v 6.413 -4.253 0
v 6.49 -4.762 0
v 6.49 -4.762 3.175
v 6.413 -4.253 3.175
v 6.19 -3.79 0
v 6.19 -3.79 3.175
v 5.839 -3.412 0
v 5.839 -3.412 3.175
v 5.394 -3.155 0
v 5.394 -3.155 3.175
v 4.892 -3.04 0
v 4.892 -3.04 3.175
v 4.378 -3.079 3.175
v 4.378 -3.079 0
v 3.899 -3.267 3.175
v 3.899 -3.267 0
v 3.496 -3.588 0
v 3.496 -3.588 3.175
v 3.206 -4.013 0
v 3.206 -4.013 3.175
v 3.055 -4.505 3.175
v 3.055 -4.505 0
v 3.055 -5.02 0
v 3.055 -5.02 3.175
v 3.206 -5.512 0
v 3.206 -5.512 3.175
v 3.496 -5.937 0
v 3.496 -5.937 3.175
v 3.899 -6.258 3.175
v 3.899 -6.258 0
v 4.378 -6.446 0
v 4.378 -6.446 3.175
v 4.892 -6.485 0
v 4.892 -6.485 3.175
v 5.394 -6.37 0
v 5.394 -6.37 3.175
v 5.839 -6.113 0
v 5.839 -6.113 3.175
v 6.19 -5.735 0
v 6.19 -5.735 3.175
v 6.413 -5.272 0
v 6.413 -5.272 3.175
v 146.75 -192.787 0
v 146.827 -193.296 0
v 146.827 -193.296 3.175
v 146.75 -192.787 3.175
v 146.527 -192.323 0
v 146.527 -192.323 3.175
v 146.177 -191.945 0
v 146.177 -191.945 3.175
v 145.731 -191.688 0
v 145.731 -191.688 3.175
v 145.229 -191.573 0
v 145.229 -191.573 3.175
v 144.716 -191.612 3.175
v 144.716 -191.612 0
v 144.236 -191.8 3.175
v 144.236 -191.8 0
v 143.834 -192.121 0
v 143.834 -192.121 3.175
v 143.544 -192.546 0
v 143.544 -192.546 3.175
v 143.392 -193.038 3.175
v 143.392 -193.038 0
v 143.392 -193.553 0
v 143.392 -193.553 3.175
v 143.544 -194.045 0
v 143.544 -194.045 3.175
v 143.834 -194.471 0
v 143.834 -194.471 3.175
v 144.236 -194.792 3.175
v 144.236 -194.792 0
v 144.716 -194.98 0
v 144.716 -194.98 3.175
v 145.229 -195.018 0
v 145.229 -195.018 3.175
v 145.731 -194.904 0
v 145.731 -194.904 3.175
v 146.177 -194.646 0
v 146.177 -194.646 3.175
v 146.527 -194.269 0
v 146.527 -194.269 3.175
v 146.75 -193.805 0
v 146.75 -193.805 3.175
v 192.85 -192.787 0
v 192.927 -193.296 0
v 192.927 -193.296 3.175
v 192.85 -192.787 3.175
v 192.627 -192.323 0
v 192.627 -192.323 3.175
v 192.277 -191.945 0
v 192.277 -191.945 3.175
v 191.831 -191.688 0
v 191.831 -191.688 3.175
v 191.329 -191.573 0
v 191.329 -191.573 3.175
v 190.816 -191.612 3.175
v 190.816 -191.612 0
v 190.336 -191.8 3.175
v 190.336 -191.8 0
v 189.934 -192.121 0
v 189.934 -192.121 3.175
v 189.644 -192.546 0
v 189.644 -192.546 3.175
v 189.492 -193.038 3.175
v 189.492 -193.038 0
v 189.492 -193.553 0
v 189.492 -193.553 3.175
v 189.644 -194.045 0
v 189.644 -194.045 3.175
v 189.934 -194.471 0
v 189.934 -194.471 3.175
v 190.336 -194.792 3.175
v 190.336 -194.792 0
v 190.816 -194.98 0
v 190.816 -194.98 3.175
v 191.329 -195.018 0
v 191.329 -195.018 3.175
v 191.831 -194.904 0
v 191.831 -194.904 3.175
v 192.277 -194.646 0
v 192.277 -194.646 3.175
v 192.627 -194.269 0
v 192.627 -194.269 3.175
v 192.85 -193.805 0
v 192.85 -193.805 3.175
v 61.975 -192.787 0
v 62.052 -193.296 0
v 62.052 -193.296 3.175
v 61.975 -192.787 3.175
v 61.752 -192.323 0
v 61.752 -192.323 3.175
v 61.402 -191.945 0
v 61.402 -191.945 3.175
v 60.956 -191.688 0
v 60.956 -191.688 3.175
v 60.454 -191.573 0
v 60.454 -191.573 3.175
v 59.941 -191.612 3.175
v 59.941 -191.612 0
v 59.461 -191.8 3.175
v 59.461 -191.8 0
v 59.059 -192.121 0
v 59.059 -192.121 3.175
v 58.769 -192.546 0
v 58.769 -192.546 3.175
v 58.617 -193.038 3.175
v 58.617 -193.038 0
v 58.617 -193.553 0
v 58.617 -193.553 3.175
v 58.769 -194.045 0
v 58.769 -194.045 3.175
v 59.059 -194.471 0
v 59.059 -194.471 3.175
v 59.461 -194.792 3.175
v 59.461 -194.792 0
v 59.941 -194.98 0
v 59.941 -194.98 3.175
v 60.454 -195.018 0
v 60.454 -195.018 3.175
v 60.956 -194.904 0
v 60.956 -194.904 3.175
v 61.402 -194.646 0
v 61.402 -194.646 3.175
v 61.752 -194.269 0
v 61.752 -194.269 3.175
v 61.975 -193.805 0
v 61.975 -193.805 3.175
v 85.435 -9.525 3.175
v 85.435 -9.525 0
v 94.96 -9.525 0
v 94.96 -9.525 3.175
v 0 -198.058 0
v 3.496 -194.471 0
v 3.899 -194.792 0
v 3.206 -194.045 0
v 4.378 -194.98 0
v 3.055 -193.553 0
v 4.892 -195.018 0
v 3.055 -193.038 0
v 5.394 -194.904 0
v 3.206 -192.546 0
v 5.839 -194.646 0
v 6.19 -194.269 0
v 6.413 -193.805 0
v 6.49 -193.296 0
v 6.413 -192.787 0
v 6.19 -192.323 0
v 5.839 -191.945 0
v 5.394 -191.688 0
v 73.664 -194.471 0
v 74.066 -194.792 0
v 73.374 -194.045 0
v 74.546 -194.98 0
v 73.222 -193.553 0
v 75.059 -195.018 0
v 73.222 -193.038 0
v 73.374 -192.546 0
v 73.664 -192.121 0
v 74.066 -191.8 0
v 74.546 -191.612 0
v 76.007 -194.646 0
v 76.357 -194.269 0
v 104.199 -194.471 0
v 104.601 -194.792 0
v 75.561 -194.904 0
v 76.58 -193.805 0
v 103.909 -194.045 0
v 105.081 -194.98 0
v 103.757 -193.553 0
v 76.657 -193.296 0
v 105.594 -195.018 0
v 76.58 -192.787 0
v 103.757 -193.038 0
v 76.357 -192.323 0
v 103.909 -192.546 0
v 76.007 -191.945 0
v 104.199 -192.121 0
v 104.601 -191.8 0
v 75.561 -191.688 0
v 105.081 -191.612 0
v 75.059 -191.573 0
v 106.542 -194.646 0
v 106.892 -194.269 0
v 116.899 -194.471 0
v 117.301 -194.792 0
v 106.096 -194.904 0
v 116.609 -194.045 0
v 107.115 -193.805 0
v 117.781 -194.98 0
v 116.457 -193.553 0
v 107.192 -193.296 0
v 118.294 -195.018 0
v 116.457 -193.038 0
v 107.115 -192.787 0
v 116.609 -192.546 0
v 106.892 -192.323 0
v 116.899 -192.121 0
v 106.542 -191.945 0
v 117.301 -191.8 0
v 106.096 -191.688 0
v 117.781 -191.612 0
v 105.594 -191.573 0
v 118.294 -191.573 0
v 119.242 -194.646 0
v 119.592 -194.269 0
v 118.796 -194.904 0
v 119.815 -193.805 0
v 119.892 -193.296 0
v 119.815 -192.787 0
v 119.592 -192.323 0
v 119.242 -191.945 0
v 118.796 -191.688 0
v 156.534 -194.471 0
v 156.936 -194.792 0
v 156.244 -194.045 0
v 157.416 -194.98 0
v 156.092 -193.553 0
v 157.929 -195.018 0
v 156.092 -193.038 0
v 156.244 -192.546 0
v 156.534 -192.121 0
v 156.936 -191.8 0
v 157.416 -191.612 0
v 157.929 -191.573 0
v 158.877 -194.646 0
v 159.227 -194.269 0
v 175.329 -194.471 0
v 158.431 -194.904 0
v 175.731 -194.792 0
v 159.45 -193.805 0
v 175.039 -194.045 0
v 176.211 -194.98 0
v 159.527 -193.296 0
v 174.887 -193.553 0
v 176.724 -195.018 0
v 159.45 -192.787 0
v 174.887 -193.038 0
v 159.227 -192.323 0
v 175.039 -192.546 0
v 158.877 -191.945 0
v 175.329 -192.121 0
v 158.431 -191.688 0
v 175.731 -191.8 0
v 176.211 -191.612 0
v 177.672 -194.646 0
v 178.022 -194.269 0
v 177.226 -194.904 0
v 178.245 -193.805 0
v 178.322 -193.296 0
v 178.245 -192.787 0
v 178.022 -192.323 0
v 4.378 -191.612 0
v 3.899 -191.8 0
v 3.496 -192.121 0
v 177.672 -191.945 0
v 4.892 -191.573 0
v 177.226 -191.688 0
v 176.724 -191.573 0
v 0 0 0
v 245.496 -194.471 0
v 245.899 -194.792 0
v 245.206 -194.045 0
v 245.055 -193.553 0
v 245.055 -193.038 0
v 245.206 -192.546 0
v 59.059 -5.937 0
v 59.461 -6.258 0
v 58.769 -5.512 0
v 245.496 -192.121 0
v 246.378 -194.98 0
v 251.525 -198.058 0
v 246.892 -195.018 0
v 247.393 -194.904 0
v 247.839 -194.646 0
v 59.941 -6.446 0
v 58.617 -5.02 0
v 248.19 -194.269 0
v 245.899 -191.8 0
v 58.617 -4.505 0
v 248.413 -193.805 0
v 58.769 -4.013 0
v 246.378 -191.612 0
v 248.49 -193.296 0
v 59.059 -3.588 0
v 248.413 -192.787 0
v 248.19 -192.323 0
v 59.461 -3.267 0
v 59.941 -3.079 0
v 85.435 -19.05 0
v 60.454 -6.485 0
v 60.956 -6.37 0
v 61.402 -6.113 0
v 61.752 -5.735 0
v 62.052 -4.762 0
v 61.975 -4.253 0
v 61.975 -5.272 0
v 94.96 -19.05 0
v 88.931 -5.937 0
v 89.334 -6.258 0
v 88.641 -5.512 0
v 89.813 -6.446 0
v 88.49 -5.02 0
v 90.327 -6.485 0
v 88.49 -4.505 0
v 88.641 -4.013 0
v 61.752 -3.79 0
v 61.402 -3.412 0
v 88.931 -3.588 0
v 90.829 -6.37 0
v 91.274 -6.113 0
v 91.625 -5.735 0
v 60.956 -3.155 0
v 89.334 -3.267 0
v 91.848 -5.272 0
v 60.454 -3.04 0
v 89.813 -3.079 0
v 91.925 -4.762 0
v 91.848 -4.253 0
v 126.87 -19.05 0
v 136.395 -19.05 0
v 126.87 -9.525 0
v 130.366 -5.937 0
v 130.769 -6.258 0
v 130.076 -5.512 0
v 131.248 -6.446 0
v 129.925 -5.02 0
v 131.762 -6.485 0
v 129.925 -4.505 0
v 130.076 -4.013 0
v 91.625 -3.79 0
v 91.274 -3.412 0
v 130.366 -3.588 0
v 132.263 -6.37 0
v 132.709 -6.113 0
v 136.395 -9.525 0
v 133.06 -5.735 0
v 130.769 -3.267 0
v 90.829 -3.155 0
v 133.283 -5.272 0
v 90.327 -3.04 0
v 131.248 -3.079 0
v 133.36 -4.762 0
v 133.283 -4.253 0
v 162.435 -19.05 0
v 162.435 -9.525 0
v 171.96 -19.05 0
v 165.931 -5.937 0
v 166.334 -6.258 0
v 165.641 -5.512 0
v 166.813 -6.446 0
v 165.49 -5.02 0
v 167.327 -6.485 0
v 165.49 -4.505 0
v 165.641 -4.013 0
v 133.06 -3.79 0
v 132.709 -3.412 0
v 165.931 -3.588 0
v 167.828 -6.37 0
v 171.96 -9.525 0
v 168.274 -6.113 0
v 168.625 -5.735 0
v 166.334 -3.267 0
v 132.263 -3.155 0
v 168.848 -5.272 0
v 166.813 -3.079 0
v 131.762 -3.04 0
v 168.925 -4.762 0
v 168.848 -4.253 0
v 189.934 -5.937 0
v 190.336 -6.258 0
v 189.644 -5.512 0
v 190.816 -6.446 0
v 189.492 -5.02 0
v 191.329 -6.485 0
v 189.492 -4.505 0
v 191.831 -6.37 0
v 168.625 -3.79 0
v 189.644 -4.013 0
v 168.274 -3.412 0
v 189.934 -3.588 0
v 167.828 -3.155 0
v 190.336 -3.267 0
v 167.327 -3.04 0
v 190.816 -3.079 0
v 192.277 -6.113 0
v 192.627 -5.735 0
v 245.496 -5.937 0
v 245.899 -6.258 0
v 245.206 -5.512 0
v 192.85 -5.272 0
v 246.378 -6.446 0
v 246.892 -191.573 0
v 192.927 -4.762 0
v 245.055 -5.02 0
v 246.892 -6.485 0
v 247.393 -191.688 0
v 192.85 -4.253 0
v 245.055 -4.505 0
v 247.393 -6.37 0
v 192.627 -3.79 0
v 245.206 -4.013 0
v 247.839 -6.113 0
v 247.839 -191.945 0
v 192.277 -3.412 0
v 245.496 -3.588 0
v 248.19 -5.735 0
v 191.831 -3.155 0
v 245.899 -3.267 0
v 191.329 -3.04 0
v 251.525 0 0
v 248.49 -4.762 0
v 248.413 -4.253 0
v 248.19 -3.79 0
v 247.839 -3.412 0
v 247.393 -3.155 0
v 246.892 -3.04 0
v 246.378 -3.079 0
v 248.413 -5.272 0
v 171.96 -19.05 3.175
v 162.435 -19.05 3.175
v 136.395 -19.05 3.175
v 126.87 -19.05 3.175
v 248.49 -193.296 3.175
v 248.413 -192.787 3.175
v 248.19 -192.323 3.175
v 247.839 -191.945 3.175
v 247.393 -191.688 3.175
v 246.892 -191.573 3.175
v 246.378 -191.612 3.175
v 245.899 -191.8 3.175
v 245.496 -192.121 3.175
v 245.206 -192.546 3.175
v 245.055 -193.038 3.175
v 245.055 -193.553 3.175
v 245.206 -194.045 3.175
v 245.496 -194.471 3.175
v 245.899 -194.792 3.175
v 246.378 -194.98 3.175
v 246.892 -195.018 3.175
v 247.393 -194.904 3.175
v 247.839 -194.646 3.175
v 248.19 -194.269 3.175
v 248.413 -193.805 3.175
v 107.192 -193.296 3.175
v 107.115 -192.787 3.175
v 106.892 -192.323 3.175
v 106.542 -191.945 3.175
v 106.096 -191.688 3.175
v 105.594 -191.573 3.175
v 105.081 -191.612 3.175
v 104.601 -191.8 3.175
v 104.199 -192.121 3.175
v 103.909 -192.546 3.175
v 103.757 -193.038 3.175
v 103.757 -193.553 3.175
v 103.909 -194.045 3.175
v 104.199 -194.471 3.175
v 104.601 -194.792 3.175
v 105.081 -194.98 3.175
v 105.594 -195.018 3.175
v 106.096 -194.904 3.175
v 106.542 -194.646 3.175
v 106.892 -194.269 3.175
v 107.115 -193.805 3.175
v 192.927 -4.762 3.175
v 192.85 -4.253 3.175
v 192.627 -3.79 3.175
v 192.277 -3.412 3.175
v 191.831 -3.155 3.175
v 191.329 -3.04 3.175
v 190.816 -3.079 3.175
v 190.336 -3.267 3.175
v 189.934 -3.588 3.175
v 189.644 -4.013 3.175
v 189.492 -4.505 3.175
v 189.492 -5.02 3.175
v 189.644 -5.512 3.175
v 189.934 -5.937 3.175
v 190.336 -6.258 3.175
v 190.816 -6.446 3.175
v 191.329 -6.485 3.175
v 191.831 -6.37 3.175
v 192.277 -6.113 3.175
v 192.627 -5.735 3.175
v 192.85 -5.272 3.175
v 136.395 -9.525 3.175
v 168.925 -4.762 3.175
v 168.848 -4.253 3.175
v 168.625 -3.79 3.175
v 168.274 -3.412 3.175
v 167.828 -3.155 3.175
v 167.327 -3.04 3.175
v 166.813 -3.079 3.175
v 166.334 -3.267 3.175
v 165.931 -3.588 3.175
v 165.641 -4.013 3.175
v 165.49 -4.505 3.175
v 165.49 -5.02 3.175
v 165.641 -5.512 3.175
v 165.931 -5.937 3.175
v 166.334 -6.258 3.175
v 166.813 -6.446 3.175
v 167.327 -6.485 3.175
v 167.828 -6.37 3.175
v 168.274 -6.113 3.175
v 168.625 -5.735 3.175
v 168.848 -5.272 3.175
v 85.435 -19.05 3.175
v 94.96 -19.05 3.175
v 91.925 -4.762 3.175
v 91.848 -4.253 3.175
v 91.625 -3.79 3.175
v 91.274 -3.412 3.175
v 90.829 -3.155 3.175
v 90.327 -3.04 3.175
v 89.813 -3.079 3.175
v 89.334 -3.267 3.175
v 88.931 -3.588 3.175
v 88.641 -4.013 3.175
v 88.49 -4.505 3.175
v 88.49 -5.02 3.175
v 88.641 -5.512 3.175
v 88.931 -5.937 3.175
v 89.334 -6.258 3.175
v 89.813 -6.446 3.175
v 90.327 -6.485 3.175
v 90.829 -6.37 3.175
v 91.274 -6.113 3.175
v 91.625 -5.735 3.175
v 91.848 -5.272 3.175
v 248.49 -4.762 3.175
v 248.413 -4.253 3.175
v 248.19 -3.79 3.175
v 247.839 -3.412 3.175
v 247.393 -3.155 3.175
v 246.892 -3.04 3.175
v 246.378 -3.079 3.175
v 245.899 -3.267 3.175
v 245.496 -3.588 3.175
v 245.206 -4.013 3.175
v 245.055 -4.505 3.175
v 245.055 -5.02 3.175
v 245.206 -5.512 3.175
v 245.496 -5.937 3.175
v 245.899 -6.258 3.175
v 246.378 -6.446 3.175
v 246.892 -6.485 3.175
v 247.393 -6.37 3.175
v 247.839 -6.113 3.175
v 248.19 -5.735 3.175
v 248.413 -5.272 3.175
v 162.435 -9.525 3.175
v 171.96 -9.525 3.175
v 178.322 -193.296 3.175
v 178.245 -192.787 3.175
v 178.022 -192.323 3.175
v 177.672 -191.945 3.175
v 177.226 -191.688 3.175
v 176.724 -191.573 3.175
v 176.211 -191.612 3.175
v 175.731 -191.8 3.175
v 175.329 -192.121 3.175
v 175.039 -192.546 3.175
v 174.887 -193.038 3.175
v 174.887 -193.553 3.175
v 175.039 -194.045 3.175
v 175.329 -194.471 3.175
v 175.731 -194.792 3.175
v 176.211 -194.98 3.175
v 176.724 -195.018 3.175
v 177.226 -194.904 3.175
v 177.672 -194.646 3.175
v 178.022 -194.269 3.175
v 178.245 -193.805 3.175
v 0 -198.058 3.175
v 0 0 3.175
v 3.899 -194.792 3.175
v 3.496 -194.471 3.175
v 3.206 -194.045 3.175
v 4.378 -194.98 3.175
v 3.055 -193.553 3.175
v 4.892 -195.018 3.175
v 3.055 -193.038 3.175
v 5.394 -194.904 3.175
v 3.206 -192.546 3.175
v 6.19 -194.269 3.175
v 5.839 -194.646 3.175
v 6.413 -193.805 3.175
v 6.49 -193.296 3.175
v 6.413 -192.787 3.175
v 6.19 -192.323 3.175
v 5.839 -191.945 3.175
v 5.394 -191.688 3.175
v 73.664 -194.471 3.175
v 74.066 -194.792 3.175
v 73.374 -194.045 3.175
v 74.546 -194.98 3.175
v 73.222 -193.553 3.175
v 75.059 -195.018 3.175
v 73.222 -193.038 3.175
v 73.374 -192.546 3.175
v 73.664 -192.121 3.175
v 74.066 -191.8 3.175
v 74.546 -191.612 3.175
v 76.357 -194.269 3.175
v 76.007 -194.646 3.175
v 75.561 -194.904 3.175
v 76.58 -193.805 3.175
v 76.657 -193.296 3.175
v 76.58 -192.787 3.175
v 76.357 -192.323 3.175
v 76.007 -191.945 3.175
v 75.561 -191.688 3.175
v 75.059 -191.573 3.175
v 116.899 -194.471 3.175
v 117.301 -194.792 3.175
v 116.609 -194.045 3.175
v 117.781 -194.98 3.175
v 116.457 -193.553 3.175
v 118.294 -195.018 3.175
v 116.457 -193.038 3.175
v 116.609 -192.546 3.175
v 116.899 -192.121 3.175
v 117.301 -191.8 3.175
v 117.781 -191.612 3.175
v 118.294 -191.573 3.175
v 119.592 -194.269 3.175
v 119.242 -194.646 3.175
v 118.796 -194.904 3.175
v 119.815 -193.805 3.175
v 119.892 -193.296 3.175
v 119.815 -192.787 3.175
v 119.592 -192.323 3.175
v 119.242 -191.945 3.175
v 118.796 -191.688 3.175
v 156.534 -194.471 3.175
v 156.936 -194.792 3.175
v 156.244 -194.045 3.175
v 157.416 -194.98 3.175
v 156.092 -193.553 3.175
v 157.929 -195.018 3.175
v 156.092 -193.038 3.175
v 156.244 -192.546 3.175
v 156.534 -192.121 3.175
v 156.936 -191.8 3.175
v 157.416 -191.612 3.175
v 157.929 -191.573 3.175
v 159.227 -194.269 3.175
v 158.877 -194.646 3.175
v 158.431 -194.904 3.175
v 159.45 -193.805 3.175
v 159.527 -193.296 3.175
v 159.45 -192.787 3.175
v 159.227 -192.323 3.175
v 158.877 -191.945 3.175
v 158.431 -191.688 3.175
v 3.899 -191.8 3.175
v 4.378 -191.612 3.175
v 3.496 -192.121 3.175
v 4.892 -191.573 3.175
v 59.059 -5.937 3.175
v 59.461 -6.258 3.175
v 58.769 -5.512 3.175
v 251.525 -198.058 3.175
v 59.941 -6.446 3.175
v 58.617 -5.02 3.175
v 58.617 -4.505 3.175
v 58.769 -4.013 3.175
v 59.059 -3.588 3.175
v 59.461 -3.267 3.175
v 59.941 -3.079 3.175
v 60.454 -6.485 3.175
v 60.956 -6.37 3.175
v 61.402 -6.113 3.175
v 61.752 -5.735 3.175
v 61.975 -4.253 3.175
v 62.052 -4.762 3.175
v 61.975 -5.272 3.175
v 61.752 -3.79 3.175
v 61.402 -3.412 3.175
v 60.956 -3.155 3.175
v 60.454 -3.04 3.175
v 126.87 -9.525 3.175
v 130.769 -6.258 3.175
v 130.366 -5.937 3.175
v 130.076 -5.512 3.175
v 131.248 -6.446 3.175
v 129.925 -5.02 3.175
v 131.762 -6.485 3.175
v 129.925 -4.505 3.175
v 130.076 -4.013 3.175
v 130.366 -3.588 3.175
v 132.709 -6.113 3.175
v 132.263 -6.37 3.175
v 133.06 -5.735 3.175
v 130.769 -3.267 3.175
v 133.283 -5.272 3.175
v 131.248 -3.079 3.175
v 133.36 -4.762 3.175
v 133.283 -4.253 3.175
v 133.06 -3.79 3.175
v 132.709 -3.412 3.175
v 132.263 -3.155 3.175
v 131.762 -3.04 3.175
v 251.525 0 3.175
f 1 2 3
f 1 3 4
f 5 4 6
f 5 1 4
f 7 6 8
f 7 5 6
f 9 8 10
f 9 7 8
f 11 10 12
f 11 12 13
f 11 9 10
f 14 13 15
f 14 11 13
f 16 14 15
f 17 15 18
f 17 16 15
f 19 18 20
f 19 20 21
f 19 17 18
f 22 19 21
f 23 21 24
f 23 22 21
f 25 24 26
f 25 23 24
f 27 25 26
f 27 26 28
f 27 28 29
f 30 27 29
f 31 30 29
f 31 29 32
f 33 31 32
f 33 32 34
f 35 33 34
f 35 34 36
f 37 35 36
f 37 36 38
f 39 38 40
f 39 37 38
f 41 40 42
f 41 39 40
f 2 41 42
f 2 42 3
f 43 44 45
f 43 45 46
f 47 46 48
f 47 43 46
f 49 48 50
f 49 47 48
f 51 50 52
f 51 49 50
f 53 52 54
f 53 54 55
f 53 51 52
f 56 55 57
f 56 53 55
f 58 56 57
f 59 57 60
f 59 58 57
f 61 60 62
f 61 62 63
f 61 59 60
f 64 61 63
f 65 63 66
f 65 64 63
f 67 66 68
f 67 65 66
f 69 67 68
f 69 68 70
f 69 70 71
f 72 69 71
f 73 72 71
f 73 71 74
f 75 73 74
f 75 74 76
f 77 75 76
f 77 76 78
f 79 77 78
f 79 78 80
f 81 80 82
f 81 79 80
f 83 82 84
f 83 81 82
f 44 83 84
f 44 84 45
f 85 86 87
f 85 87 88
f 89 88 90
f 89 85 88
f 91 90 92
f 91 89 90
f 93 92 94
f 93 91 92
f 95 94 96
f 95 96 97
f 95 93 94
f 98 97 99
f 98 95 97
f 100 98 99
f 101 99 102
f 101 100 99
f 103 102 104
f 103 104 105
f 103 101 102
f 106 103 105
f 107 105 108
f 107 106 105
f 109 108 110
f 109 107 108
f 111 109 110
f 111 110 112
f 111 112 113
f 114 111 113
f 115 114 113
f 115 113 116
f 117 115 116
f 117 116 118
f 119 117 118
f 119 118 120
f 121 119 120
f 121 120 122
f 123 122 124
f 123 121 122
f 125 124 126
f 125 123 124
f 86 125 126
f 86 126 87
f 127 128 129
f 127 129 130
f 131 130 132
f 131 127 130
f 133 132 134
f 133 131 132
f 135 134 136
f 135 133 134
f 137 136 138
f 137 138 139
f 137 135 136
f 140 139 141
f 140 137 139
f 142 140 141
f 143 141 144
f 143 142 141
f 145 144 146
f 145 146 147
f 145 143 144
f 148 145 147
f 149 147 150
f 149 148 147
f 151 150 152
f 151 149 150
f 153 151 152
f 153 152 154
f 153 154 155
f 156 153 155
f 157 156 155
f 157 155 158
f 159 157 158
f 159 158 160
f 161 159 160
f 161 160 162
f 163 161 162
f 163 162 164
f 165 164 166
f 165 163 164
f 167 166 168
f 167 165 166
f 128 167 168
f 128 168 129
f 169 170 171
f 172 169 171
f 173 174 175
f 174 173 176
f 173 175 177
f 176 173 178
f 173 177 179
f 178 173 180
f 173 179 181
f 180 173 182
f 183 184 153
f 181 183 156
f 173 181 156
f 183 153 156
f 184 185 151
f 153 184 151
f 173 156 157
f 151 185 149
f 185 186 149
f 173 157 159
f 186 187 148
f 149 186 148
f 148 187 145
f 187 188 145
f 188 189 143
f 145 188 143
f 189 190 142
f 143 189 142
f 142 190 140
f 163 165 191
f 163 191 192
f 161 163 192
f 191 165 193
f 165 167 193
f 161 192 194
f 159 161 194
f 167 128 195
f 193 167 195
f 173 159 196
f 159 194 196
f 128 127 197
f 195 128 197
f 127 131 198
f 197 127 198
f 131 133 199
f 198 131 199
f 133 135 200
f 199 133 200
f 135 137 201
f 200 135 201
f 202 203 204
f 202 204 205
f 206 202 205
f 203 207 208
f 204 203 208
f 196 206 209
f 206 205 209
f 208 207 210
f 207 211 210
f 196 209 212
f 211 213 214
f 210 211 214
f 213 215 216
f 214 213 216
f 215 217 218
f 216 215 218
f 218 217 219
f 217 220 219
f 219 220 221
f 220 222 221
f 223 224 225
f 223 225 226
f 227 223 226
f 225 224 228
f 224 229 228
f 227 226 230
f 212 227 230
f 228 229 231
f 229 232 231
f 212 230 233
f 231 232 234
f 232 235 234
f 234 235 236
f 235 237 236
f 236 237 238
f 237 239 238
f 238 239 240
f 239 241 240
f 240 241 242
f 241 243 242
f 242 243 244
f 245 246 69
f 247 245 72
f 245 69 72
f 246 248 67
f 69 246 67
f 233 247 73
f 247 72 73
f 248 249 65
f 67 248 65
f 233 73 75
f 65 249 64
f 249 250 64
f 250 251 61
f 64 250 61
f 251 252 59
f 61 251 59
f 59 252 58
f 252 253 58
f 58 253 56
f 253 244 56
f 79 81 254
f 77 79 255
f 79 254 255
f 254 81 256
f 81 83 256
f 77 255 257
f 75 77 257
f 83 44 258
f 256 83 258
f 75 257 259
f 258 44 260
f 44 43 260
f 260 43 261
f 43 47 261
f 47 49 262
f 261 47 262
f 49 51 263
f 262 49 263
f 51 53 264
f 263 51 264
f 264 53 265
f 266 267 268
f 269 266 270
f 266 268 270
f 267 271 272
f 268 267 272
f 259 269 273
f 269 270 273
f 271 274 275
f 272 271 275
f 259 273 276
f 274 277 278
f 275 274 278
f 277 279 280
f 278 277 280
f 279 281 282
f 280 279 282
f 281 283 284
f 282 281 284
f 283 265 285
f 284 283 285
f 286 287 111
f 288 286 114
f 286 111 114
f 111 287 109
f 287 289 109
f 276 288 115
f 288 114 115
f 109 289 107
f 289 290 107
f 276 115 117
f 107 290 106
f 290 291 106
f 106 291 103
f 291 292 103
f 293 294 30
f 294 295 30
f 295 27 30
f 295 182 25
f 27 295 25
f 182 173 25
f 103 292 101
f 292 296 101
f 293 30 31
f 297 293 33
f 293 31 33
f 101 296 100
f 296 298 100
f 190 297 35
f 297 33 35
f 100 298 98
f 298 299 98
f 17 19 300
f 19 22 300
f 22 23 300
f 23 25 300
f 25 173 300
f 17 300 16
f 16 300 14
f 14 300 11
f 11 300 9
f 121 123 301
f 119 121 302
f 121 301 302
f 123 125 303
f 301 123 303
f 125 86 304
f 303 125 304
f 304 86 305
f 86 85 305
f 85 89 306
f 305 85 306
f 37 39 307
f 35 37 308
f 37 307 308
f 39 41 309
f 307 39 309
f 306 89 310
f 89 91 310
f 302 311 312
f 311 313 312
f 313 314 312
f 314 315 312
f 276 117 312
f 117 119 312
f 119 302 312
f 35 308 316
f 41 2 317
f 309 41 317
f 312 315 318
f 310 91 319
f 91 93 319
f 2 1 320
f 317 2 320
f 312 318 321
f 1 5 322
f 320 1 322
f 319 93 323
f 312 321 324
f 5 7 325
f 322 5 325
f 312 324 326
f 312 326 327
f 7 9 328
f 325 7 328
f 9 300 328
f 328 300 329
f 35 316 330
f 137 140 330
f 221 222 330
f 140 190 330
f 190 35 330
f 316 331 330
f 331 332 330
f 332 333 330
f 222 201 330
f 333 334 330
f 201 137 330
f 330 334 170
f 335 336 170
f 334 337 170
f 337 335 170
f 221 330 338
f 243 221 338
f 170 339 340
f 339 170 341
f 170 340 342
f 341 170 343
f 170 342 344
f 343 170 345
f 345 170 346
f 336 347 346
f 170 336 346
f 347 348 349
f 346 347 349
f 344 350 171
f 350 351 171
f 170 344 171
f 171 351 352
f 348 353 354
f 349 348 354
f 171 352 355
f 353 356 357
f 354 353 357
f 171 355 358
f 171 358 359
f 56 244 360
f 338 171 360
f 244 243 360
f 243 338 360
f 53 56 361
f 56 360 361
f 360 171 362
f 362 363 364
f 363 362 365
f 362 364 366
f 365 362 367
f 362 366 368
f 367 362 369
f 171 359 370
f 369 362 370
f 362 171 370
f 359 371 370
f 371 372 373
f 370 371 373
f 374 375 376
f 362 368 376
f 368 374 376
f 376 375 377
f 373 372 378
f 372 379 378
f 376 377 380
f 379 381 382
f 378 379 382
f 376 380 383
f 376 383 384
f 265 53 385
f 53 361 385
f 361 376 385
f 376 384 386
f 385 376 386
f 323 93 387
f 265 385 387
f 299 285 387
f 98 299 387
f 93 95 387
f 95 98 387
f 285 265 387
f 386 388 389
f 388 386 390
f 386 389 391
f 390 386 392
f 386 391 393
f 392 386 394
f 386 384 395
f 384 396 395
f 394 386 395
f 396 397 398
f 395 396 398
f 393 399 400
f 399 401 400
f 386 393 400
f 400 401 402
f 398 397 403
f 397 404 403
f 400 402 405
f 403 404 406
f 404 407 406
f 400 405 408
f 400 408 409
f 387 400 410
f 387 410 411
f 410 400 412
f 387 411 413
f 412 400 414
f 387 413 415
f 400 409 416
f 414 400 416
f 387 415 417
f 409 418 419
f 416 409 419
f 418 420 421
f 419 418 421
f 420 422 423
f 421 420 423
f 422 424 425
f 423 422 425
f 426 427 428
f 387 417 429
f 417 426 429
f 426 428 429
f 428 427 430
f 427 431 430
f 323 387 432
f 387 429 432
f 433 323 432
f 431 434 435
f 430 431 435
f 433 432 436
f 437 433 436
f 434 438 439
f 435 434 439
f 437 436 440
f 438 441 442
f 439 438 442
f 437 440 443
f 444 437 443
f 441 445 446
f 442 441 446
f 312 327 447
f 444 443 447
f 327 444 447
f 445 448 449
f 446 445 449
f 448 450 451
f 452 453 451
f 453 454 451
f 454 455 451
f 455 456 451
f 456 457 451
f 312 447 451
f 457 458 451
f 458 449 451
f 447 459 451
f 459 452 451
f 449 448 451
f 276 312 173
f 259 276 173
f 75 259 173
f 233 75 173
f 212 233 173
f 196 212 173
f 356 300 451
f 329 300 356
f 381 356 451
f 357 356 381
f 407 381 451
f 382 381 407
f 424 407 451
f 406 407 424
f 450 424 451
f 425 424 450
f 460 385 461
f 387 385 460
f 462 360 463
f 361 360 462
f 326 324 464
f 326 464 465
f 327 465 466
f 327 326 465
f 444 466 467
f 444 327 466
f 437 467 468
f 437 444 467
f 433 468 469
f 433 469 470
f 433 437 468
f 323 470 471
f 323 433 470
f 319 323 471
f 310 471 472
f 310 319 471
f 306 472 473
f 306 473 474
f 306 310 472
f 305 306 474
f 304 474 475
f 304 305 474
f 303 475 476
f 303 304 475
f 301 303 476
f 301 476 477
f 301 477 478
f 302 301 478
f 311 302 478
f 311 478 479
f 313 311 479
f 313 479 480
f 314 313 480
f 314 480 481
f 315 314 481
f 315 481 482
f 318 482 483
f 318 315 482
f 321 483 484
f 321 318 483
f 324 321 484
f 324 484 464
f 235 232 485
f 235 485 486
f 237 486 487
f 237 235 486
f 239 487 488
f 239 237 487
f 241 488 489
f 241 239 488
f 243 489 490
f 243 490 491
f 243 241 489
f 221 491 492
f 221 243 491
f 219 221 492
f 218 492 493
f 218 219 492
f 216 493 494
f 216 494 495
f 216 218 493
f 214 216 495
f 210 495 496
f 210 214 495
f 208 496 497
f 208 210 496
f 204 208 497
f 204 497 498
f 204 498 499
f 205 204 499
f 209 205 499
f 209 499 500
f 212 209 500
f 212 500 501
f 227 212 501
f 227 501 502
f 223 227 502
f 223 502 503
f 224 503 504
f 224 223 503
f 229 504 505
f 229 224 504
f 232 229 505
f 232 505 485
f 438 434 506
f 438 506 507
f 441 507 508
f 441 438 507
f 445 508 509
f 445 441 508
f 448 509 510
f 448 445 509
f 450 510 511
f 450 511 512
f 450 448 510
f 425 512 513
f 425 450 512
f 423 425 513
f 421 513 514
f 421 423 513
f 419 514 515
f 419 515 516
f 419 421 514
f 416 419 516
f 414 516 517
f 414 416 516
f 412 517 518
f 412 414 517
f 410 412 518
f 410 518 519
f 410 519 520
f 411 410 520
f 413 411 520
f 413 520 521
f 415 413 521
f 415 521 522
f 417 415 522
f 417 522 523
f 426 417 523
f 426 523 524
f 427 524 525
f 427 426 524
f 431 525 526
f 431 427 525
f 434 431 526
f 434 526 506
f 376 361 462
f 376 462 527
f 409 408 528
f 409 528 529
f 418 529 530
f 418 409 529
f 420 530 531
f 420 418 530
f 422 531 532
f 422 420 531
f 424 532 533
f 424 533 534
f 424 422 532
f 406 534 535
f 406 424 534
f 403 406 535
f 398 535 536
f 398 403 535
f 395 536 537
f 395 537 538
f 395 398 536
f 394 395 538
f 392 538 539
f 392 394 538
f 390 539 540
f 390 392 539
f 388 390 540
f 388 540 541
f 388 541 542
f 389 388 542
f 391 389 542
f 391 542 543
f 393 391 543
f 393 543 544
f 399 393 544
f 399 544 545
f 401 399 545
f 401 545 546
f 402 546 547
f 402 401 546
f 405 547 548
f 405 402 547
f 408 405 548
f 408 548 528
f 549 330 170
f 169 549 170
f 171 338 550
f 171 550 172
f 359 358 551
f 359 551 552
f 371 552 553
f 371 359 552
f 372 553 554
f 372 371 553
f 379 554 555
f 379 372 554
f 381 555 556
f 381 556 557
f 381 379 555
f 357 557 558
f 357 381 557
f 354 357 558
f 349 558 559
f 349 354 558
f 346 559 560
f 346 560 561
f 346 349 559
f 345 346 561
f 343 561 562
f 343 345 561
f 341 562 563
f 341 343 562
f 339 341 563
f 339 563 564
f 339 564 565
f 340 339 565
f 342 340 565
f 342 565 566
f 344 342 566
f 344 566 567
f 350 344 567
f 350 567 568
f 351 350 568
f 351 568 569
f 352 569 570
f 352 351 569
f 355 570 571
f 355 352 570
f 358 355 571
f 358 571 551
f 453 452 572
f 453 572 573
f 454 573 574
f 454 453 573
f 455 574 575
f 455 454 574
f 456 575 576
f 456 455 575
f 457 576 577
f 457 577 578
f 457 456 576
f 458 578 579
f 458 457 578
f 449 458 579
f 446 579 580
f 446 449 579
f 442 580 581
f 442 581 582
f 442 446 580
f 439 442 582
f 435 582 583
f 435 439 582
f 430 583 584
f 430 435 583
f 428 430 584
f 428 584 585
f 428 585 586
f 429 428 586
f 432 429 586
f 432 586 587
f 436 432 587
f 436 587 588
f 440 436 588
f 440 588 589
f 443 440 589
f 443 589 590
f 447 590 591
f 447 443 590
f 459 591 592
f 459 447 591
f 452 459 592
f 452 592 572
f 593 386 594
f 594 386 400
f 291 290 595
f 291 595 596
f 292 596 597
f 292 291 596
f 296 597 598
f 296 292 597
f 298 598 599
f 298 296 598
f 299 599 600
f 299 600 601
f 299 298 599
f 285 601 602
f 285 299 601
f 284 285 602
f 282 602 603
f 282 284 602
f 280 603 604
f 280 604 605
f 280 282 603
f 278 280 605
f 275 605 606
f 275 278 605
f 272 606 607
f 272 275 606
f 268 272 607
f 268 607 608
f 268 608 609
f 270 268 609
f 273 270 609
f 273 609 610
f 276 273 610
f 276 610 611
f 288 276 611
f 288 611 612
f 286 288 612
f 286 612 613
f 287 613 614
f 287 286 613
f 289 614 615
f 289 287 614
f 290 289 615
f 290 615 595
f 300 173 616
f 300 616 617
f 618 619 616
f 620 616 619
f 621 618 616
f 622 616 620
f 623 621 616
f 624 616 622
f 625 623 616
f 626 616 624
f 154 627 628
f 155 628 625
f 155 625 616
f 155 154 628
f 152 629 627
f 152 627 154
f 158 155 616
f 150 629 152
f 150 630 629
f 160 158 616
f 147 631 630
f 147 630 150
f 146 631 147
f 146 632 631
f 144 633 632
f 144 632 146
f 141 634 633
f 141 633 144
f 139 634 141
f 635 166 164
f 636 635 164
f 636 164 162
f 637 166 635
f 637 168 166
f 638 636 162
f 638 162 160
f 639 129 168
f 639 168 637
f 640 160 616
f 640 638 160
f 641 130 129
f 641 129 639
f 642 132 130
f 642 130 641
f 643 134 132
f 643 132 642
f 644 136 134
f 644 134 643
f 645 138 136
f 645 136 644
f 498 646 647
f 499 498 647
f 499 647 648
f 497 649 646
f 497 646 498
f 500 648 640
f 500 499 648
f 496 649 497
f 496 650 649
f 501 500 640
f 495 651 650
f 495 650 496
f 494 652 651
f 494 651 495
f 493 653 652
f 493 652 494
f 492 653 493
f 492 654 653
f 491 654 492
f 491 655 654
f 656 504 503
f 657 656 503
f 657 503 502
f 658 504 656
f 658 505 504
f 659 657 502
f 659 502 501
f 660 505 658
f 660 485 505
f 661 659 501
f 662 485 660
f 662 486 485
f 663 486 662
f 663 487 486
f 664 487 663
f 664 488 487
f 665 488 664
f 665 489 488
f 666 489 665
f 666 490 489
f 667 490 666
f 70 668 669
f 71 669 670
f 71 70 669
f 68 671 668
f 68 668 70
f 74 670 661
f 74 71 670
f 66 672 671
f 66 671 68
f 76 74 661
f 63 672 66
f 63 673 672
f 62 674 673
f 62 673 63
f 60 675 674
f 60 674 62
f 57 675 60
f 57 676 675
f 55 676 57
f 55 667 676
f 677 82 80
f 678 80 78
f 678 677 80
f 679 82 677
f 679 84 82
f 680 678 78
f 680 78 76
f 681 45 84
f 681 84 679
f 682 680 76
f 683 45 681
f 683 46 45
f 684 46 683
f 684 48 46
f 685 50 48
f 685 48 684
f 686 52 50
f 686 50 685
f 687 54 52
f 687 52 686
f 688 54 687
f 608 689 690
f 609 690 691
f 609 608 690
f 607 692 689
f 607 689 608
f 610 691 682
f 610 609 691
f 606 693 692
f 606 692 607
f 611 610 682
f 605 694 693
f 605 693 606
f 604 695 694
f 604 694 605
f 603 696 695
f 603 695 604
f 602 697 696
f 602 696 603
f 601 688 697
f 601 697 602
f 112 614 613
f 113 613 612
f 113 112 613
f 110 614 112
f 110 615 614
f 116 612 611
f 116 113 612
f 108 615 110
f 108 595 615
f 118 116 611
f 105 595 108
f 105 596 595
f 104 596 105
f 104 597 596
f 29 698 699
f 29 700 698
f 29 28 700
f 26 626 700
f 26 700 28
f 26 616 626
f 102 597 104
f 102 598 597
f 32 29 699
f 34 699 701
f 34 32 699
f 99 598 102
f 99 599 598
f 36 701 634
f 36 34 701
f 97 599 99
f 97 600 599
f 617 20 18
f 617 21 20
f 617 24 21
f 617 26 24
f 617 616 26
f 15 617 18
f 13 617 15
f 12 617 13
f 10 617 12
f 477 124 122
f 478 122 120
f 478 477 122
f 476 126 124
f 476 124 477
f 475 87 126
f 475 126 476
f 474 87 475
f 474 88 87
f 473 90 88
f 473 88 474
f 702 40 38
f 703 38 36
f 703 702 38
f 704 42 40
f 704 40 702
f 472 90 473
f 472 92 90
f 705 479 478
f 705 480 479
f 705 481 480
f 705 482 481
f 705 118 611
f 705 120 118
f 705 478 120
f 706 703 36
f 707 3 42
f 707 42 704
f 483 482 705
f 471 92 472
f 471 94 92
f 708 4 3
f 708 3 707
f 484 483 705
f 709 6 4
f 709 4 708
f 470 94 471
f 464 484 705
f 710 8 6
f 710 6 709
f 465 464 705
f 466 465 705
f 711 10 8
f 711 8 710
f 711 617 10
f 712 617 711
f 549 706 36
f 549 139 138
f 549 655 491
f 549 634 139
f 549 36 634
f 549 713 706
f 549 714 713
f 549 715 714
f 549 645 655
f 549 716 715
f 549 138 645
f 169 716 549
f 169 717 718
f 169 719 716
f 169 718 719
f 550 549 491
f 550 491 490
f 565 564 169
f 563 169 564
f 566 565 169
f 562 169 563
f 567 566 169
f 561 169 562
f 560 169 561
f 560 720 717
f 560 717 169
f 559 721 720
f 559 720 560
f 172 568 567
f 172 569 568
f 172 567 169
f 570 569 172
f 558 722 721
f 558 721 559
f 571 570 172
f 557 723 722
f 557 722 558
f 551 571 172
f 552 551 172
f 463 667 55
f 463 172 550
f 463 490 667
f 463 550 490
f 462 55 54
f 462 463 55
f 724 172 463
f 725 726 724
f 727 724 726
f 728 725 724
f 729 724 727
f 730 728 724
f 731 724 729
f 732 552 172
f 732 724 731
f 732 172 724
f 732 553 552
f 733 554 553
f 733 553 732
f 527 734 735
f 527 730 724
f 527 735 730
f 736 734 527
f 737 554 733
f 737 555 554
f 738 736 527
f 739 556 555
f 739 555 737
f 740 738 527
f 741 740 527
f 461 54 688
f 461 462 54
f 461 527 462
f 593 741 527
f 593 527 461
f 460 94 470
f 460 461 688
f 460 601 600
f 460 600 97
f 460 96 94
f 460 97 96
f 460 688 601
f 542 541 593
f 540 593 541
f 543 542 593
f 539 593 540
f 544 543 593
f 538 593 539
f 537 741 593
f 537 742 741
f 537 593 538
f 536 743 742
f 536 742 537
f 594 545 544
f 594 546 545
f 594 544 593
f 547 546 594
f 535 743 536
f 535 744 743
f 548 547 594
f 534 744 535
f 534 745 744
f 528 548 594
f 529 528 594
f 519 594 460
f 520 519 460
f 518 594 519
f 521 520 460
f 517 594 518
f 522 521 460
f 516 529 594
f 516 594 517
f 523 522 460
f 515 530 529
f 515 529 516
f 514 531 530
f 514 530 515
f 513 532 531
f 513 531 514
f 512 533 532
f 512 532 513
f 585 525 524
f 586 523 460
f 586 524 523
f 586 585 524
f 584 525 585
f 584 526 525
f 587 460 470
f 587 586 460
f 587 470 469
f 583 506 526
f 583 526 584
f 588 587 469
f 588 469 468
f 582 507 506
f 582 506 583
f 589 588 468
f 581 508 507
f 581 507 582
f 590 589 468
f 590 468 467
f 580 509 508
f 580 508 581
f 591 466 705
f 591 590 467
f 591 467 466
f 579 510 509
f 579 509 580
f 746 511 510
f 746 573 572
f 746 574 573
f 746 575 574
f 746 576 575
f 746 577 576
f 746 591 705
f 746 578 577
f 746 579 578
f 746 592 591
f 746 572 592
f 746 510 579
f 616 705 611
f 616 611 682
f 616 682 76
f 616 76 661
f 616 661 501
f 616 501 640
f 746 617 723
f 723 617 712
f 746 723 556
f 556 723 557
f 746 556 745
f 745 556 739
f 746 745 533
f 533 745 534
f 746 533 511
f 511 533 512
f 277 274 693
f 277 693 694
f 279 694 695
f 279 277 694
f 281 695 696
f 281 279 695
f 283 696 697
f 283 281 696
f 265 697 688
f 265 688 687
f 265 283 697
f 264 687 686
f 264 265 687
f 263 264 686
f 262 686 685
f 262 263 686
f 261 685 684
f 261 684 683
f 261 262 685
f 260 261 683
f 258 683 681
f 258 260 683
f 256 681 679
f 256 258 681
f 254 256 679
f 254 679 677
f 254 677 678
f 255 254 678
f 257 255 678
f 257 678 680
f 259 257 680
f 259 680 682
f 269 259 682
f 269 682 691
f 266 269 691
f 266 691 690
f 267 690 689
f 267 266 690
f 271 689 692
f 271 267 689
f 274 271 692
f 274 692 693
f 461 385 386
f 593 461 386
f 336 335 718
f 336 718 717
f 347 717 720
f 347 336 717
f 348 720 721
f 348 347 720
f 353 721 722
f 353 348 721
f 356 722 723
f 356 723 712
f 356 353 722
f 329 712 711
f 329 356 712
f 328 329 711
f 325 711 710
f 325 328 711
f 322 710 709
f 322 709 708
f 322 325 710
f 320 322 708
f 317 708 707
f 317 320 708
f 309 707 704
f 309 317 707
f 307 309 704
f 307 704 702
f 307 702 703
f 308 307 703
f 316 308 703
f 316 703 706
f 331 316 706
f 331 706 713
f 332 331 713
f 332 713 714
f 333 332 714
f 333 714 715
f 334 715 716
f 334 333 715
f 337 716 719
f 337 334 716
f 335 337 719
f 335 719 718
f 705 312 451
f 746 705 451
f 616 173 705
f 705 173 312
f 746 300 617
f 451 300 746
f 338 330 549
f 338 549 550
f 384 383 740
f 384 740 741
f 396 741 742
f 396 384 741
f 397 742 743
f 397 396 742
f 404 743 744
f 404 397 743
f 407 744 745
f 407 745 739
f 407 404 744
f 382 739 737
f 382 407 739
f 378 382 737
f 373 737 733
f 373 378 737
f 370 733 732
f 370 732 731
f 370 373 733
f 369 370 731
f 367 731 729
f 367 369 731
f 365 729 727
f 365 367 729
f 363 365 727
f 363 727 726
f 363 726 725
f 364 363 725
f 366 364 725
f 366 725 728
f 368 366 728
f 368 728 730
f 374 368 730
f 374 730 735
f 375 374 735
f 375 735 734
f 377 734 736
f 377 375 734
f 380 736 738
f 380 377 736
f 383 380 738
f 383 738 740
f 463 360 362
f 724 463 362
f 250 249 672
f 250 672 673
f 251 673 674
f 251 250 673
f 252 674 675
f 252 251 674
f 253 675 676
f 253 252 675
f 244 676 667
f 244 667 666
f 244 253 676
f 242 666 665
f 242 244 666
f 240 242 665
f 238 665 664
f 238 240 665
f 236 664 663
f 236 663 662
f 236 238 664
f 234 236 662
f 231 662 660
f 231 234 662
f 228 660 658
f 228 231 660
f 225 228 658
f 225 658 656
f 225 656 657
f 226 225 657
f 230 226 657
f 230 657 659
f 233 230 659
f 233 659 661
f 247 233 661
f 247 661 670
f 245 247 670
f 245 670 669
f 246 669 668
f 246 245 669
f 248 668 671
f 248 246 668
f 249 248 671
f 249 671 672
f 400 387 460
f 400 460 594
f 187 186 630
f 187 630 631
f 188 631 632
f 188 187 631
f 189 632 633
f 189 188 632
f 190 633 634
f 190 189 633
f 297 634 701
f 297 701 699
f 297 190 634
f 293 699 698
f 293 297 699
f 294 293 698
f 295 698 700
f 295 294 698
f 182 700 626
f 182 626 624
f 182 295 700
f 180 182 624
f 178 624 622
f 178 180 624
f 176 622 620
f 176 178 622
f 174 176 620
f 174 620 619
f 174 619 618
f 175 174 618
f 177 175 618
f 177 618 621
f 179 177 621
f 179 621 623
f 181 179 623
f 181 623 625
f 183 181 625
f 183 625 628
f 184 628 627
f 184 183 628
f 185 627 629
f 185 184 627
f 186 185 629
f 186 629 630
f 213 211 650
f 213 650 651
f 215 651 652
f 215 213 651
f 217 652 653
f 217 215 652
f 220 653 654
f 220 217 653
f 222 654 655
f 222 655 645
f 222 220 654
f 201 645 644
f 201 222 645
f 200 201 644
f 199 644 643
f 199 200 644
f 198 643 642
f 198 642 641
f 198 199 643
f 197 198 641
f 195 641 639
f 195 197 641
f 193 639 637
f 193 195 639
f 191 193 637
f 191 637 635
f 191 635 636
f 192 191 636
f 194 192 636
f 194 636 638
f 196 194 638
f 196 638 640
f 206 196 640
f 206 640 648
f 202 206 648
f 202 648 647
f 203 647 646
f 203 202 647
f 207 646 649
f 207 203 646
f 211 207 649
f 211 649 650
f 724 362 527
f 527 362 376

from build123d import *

# Parameters (mm, degrees)
F0_W     = 251.524948
F0_H     = 198.058253
F0_R     = 1.7272
F0_W_2   = 9.525
F0_H_2   = 9.525
F1_DEPTH = 3.175


with BuildPart() as f1:
    # F0 (on Top) → F1 (new body)
    with BuildSketch(Plane.XY):
        with Locations((125.762474, -99.029126)):
            Rectangle(F0_W, F0_H)
        with Locations((4.7625, -193.295753)):
            Circle(F0_R, mode=Mode.SUBTRACT)
        with Locations((60.325, -193.295753)):
            Circle(F0_R, mode=Mode.SUBTRACT)
        with Locations((74.93, -193.295753)):
            Circle(F0_R, mode=Mode.SUBTRACT)
        with Locations((105.464991, -193.295753)):
            Circle(F0_R, mode=Mode.SUBTRACT)
        with Locations((118.164991, -193.295753)):
            Circle(F0_R, mode=Mode.SUBTRACT)
        with Locations((145.099938, -193.295753)):
            Circle(F0_R, mode=Mode.SUBTRACT)
        with Locations((157.799938, -193.295753)):
            Circle(F0_R, mode=Mode.SUBTRACT)
        with Locations((176.594948, -193.295753)):
            Circle(F0_R, mode=Mode.SUBTRACT)
        with Locations((191.199948, -193.295753)):
            Circle(F0_R, mode=Mode.SUBTRACT)
        with Locations((246.762448, -193.295753)):
            Circle(F0_R, mode=Mode.SUBTRACT)
        with Locations((4.7625, -4.7625)):
            Circle(F0_R, mode=Mode.SUBTRACT)
        with Locations((60.325, -4.7625)):
            Circle(F0_R, mode=Mode.SUBTRACT)
        with Locations((90.197496, -14.2875)):
            Rectangle(F0_W_2, F0_H_2, mode=Mode.SUBTRACT)
        with Locations((90.197496, -4.7625)):
            Circle(F0_R, mode=Mode.SUBTRACT)
        with Locations((131.632465, -14.2875)):
            Rectangle(F0_W_2, F0_H_2, mode=Mode.SUBTRACT)
        with Locations((131.632465, -4.7625)):
            Circle(F0_R, mode=Mode.SUBTRACT)
        with Locations((167.197443, -14.2875)):
            Rectangle(F0_W_2, F0_H_2, mode=Mode.SUBTRACT)
        with Locations((167.197443, -4.7625)):
            Circle(F0_R, mode=Mode.SUBTRACT)
        with Locations((191.199948, -4.7625)):
            Circle(F0_R, mode=Mode.SUBTRACT)
        with Locations((246.762448, -4.7625)):
            Circle(F0_R, mode=Mode.SUBTRACT)
    extrude(amount=F1_DEPTH)


solid = f1.part
